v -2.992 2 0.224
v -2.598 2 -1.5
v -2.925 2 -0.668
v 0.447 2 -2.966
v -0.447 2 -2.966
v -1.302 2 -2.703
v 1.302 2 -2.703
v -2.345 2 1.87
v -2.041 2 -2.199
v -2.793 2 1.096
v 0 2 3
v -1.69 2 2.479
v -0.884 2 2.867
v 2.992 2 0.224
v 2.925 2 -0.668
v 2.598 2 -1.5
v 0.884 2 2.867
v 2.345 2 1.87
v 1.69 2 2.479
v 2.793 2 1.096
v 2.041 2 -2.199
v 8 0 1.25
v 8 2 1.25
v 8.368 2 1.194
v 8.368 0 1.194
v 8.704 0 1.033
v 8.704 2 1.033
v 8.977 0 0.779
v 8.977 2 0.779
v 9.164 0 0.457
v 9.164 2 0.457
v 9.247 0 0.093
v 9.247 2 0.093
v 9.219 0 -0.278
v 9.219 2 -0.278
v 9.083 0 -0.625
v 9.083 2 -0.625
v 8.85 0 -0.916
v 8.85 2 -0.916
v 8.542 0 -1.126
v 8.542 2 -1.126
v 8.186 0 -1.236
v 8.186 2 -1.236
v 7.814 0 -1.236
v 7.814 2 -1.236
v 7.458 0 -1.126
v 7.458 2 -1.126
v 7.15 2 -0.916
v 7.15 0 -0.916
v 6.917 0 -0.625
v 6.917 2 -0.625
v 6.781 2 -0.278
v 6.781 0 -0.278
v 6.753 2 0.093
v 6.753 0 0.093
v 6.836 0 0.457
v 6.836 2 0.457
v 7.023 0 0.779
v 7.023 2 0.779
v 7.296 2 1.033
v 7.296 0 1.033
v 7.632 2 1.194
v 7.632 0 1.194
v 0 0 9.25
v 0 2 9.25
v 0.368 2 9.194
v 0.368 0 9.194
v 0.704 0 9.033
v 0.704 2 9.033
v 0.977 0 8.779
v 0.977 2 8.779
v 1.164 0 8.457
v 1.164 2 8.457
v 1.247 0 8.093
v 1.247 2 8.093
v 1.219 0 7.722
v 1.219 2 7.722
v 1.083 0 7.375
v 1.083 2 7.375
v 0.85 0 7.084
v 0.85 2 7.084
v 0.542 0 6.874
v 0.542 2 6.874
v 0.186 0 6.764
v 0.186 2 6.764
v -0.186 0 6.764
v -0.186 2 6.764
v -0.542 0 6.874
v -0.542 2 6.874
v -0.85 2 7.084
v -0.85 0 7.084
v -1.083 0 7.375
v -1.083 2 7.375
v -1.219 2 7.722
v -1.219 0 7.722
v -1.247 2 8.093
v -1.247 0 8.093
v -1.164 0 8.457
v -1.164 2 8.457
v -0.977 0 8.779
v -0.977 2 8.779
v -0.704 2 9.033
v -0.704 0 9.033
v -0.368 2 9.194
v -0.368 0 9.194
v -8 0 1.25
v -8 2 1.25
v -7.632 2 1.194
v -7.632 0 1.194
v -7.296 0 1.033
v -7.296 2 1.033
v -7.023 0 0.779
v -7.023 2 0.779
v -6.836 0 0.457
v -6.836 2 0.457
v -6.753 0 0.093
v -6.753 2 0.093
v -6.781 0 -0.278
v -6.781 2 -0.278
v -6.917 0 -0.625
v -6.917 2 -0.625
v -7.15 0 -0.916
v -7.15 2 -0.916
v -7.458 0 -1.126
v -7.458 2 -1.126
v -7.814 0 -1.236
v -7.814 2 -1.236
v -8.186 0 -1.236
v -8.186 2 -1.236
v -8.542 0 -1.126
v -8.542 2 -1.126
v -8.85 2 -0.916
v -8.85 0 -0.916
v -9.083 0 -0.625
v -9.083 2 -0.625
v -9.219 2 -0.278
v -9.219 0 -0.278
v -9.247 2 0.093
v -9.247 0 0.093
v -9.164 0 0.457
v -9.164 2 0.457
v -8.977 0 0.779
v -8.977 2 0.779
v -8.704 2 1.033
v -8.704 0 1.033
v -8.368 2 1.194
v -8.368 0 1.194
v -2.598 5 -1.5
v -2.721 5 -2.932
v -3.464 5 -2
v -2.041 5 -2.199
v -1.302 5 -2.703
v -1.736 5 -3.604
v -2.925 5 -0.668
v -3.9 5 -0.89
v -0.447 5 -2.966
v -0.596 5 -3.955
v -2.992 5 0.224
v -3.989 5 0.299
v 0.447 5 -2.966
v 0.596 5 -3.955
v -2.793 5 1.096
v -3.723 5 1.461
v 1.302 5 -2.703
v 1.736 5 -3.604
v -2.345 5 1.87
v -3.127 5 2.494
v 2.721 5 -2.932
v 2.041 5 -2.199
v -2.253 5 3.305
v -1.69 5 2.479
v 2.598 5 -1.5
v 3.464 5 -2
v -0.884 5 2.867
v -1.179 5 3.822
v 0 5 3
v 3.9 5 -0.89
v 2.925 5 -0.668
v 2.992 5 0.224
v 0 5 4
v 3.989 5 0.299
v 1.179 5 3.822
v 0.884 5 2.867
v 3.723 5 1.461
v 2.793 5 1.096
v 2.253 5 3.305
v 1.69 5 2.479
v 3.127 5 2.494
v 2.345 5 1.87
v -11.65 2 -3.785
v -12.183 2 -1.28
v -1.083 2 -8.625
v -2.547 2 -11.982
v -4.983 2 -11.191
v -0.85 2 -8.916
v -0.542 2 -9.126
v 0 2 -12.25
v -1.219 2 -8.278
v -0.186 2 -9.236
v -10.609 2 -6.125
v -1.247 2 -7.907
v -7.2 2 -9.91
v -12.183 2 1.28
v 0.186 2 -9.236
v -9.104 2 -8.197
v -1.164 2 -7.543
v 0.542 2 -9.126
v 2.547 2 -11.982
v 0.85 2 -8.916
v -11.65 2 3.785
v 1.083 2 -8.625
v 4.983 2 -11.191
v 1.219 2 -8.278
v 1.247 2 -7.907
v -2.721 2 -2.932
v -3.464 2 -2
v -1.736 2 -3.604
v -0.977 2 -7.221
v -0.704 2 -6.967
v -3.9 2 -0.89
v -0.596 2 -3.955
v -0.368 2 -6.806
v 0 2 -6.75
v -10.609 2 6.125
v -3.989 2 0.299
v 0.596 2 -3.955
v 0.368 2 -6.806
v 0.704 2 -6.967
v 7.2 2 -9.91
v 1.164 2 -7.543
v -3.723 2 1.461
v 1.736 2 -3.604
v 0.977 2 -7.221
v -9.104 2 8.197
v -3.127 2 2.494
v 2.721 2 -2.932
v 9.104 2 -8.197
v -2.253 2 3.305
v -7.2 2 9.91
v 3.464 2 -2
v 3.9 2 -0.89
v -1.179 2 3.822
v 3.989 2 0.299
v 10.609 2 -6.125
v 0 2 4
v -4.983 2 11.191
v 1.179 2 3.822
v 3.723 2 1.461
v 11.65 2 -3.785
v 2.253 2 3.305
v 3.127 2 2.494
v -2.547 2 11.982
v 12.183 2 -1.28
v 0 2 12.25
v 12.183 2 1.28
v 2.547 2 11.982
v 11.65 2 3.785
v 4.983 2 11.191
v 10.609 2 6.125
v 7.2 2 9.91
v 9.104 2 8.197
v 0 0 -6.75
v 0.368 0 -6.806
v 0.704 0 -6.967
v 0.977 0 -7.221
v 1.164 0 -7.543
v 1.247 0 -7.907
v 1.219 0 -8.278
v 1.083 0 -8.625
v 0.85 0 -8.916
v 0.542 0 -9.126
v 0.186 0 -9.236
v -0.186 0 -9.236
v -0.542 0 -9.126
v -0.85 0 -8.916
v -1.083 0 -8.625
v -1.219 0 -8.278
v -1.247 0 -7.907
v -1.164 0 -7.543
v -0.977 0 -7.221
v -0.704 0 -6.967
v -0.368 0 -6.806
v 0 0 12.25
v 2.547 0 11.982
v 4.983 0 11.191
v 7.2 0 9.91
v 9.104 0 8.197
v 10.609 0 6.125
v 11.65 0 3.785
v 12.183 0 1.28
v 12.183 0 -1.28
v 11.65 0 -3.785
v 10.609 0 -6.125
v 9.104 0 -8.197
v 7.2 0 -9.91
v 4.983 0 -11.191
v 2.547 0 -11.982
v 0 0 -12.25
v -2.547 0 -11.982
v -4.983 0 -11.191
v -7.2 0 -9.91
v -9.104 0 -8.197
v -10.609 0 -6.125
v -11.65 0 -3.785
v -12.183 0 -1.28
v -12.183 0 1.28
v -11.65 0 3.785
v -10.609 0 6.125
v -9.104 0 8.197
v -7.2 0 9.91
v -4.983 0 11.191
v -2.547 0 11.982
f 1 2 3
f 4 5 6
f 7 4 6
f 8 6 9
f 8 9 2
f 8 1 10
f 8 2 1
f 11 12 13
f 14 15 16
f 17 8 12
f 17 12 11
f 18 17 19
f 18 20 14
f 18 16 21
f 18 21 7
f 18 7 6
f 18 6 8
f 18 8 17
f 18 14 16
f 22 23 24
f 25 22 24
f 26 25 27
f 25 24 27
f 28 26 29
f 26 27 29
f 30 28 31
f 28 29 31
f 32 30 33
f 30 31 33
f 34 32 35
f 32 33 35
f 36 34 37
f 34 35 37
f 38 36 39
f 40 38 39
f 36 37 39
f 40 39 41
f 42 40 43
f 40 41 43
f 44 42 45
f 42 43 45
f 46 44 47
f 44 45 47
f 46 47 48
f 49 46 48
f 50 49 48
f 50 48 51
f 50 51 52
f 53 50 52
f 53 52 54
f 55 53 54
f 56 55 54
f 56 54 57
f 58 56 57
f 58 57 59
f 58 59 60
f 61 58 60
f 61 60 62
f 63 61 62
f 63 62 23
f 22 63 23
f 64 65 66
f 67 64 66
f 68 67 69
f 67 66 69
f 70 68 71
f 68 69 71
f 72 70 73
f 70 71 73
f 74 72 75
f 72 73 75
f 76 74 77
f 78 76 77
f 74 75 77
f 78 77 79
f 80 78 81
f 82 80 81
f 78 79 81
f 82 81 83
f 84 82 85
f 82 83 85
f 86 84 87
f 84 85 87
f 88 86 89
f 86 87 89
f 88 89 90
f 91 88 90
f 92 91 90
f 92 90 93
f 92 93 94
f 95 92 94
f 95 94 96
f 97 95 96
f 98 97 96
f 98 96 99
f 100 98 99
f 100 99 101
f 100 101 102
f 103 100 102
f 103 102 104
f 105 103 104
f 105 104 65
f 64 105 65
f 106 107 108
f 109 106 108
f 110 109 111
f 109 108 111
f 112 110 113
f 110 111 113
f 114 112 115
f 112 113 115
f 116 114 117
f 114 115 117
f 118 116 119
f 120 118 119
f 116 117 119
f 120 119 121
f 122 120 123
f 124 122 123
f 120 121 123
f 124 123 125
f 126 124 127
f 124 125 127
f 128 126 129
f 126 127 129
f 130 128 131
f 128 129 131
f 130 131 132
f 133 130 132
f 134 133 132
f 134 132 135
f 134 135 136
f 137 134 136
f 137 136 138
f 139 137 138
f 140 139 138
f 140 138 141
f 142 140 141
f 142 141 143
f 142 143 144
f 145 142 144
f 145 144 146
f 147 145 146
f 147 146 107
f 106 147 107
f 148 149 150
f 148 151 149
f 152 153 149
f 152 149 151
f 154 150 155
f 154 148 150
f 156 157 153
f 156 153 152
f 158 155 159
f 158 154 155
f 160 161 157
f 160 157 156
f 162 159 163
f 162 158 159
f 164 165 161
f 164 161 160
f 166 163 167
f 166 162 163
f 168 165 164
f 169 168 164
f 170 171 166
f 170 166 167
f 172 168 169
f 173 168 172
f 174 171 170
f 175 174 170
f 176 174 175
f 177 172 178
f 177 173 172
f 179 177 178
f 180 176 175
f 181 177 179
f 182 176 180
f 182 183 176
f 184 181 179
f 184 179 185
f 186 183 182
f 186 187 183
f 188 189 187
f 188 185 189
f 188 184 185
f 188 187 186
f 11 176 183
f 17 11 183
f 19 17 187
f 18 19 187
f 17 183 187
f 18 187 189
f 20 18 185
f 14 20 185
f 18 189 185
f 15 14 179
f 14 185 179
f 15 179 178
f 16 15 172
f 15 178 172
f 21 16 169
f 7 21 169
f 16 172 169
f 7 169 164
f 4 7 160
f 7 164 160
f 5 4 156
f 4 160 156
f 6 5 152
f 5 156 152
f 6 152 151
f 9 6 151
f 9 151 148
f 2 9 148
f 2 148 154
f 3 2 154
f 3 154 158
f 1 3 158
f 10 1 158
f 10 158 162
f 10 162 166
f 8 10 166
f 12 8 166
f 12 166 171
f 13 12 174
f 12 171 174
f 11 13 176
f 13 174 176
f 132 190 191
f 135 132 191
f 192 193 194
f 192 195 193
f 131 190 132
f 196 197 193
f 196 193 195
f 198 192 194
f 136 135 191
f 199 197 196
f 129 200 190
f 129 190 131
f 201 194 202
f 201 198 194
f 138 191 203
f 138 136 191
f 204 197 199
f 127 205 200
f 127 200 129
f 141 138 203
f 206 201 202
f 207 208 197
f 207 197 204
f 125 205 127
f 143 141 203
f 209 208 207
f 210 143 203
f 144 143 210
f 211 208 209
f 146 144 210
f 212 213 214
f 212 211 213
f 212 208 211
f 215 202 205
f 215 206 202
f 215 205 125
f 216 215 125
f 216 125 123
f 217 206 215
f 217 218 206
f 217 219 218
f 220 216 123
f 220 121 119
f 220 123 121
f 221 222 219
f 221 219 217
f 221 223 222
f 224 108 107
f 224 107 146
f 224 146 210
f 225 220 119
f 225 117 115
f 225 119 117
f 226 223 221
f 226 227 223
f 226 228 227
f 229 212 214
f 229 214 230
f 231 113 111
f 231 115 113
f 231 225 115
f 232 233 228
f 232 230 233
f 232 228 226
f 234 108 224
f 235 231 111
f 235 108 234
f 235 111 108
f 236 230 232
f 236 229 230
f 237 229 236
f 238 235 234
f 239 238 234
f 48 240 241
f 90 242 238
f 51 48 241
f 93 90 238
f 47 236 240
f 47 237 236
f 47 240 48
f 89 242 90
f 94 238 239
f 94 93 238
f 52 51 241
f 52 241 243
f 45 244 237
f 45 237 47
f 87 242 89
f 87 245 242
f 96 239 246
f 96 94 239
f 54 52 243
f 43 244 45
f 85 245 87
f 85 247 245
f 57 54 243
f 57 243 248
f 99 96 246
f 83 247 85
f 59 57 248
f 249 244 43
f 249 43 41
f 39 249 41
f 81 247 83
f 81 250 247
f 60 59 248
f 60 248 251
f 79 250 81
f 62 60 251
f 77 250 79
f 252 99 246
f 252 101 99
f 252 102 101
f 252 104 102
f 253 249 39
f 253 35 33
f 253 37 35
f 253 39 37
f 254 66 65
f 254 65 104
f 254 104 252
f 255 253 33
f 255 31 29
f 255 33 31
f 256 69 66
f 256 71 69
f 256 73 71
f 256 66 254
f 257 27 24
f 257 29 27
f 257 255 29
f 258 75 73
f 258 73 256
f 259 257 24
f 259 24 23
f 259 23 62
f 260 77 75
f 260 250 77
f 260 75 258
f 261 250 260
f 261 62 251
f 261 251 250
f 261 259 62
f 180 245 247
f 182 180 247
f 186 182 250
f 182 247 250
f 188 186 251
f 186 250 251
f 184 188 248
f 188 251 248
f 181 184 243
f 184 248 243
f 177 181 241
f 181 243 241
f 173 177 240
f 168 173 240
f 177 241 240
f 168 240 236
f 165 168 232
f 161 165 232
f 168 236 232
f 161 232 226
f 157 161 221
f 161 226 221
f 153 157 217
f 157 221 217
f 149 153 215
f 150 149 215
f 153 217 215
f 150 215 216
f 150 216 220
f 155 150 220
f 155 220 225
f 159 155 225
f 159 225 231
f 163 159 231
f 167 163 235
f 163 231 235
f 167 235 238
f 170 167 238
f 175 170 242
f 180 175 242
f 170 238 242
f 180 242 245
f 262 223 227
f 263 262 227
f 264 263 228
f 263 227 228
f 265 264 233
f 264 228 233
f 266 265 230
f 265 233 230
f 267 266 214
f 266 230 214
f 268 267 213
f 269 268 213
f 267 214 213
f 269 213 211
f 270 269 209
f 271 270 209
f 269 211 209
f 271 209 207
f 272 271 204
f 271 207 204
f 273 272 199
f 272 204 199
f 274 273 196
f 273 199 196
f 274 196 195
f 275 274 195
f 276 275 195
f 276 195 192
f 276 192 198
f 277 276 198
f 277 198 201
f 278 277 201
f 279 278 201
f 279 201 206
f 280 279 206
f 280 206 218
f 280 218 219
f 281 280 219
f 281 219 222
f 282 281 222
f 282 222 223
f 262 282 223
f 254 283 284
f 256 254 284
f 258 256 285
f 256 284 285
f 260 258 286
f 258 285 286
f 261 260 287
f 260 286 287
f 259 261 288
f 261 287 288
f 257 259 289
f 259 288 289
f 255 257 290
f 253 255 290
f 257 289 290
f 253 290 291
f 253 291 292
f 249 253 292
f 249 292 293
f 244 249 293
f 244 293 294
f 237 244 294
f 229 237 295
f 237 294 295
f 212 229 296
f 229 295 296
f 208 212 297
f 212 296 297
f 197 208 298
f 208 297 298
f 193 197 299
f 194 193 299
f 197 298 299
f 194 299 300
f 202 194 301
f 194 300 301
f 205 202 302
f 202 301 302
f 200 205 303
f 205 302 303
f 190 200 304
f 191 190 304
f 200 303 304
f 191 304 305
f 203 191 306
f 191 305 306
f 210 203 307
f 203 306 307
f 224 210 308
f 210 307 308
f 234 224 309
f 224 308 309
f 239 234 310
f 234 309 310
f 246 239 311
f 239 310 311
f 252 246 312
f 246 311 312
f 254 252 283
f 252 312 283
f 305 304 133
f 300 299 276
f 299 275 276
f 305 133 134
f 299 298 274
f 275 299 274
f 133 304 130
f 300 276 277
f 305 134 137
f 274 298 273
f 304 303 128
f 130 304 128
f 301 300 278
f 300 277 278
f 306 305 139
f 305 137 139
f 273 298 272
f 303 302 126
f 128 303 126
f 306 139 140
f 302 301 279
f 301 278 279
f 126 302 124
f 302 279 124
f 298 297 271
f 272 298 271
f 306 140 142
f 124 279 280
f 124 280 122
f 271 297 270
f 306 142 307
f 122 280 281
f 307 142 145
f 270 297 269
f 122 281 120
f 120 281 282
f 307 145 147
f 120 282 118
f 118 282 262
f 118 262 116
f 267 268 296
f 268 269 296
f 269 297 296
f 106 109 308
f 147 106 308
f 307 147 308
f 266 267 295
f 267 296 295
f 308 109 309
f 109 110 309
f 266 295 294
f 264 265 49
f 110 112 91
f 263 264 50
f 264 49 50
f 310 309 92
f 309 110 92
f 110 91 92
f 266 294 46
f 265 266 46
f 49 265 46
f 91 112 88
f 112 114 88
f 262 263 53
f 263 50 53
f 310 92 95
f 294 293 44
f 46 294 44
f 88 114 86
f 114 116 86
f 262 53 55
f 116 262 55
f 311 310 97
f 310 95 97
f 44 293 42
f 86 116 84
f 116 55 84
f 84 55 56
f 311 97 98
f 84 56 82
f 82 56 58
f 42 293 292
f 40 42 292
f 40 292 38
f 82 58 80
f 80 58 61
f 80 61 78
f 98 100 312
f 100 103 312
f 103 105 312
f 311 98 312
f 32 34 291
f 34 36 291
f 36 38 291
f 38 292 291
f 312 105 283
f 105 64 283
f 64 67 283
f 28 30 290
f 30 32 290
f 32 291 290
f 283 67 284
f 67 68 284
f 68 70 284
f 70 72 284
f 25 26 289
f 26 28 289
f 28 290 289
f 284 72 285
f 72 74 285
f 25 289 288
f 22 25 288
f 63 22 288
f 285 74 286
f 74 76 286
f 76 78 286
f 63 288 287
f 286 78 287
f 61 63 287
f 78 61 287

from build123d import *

# Parameters (mm, degrees)
SKETCH_1_R          = 12.25
EXTRUDE_1_DEPTH     = 2
SKETCH_2_R          = 4
EXTRUDE_2_DEPTH     = 3
SKETCH_3_R          = 1.25
CUT_EXTRUDE_1_DEPTH = 3
SKETCH_4_R          = 3
CUT_EXTRUDE_2_DEPTH = 3


with BuildPart() as part:
    # 草图1 → 凸台-拉伸1 (new body)
    with BuildSketch(Plane(origin=(0, 0, 0), x_dir=(1, 0, 0), z_dir=(0, 1, 0))):
        with Locations(Location((0, 0, 0), (0, 0, 270))):
            Circle(SKETCH_1_R)
    extrude(amount=EXTRUDE_1_DEPTH)

    # 草图2 → 凸台-拉伸2 (add)
    with BuildSketch(Plane(origin=(0, 2, 0), x_dir=(1, 0, 0), z_dir=(0, 1, 0))):
        with Locations(Location((0, 0, 0), (0, 0, 270))):
            Circle(SKETCH_2_R)
    extrude(amount=EXTRUDE_2_DEPTH)

    # 草图3 → 切除-拉伸1 (cut)
    with BuildSketch(Plane(origin=(0, 2, 0), x_dir=(1, 0, 0), z_dir=(0, 1, 0))):
        with Locations(Location((-8, 0, 0), (0, 0, 270))):
            Circle(SKETCH_3_R)
        with Locations(Location((0, 8, 0), (0, 0, 270))):
            Circle(SKETCH_3_R)
        with Locations(Location((8, 0, 0), (0, 0, 270))):
            Circle(SKETCH_3_R)
        with Locations(Location((0, -8, 0), (0, 0, 270))):
            Circle(SKETCH_3_R)
    extrude(amount=-CUT_EXTRUDE_1_DEPTH, mode=Mode.SUBTRACT)

    # 草图4 → 切除-拉伸2 (cut)
    with BuildSketch(Plane(origin=(0, 5, 0), x_dir=(1, 0, 0), z_dir=(0, 1, 0))):
        with Locations(Location((0, 0, 0), (0, 0, 270))):
            Circle(SKETCH_4_R)
    extrude(amount=-CUT_EXTRUDE_2_DEPTH, mode=Mode.SUBTRACT)


solid = part.part
